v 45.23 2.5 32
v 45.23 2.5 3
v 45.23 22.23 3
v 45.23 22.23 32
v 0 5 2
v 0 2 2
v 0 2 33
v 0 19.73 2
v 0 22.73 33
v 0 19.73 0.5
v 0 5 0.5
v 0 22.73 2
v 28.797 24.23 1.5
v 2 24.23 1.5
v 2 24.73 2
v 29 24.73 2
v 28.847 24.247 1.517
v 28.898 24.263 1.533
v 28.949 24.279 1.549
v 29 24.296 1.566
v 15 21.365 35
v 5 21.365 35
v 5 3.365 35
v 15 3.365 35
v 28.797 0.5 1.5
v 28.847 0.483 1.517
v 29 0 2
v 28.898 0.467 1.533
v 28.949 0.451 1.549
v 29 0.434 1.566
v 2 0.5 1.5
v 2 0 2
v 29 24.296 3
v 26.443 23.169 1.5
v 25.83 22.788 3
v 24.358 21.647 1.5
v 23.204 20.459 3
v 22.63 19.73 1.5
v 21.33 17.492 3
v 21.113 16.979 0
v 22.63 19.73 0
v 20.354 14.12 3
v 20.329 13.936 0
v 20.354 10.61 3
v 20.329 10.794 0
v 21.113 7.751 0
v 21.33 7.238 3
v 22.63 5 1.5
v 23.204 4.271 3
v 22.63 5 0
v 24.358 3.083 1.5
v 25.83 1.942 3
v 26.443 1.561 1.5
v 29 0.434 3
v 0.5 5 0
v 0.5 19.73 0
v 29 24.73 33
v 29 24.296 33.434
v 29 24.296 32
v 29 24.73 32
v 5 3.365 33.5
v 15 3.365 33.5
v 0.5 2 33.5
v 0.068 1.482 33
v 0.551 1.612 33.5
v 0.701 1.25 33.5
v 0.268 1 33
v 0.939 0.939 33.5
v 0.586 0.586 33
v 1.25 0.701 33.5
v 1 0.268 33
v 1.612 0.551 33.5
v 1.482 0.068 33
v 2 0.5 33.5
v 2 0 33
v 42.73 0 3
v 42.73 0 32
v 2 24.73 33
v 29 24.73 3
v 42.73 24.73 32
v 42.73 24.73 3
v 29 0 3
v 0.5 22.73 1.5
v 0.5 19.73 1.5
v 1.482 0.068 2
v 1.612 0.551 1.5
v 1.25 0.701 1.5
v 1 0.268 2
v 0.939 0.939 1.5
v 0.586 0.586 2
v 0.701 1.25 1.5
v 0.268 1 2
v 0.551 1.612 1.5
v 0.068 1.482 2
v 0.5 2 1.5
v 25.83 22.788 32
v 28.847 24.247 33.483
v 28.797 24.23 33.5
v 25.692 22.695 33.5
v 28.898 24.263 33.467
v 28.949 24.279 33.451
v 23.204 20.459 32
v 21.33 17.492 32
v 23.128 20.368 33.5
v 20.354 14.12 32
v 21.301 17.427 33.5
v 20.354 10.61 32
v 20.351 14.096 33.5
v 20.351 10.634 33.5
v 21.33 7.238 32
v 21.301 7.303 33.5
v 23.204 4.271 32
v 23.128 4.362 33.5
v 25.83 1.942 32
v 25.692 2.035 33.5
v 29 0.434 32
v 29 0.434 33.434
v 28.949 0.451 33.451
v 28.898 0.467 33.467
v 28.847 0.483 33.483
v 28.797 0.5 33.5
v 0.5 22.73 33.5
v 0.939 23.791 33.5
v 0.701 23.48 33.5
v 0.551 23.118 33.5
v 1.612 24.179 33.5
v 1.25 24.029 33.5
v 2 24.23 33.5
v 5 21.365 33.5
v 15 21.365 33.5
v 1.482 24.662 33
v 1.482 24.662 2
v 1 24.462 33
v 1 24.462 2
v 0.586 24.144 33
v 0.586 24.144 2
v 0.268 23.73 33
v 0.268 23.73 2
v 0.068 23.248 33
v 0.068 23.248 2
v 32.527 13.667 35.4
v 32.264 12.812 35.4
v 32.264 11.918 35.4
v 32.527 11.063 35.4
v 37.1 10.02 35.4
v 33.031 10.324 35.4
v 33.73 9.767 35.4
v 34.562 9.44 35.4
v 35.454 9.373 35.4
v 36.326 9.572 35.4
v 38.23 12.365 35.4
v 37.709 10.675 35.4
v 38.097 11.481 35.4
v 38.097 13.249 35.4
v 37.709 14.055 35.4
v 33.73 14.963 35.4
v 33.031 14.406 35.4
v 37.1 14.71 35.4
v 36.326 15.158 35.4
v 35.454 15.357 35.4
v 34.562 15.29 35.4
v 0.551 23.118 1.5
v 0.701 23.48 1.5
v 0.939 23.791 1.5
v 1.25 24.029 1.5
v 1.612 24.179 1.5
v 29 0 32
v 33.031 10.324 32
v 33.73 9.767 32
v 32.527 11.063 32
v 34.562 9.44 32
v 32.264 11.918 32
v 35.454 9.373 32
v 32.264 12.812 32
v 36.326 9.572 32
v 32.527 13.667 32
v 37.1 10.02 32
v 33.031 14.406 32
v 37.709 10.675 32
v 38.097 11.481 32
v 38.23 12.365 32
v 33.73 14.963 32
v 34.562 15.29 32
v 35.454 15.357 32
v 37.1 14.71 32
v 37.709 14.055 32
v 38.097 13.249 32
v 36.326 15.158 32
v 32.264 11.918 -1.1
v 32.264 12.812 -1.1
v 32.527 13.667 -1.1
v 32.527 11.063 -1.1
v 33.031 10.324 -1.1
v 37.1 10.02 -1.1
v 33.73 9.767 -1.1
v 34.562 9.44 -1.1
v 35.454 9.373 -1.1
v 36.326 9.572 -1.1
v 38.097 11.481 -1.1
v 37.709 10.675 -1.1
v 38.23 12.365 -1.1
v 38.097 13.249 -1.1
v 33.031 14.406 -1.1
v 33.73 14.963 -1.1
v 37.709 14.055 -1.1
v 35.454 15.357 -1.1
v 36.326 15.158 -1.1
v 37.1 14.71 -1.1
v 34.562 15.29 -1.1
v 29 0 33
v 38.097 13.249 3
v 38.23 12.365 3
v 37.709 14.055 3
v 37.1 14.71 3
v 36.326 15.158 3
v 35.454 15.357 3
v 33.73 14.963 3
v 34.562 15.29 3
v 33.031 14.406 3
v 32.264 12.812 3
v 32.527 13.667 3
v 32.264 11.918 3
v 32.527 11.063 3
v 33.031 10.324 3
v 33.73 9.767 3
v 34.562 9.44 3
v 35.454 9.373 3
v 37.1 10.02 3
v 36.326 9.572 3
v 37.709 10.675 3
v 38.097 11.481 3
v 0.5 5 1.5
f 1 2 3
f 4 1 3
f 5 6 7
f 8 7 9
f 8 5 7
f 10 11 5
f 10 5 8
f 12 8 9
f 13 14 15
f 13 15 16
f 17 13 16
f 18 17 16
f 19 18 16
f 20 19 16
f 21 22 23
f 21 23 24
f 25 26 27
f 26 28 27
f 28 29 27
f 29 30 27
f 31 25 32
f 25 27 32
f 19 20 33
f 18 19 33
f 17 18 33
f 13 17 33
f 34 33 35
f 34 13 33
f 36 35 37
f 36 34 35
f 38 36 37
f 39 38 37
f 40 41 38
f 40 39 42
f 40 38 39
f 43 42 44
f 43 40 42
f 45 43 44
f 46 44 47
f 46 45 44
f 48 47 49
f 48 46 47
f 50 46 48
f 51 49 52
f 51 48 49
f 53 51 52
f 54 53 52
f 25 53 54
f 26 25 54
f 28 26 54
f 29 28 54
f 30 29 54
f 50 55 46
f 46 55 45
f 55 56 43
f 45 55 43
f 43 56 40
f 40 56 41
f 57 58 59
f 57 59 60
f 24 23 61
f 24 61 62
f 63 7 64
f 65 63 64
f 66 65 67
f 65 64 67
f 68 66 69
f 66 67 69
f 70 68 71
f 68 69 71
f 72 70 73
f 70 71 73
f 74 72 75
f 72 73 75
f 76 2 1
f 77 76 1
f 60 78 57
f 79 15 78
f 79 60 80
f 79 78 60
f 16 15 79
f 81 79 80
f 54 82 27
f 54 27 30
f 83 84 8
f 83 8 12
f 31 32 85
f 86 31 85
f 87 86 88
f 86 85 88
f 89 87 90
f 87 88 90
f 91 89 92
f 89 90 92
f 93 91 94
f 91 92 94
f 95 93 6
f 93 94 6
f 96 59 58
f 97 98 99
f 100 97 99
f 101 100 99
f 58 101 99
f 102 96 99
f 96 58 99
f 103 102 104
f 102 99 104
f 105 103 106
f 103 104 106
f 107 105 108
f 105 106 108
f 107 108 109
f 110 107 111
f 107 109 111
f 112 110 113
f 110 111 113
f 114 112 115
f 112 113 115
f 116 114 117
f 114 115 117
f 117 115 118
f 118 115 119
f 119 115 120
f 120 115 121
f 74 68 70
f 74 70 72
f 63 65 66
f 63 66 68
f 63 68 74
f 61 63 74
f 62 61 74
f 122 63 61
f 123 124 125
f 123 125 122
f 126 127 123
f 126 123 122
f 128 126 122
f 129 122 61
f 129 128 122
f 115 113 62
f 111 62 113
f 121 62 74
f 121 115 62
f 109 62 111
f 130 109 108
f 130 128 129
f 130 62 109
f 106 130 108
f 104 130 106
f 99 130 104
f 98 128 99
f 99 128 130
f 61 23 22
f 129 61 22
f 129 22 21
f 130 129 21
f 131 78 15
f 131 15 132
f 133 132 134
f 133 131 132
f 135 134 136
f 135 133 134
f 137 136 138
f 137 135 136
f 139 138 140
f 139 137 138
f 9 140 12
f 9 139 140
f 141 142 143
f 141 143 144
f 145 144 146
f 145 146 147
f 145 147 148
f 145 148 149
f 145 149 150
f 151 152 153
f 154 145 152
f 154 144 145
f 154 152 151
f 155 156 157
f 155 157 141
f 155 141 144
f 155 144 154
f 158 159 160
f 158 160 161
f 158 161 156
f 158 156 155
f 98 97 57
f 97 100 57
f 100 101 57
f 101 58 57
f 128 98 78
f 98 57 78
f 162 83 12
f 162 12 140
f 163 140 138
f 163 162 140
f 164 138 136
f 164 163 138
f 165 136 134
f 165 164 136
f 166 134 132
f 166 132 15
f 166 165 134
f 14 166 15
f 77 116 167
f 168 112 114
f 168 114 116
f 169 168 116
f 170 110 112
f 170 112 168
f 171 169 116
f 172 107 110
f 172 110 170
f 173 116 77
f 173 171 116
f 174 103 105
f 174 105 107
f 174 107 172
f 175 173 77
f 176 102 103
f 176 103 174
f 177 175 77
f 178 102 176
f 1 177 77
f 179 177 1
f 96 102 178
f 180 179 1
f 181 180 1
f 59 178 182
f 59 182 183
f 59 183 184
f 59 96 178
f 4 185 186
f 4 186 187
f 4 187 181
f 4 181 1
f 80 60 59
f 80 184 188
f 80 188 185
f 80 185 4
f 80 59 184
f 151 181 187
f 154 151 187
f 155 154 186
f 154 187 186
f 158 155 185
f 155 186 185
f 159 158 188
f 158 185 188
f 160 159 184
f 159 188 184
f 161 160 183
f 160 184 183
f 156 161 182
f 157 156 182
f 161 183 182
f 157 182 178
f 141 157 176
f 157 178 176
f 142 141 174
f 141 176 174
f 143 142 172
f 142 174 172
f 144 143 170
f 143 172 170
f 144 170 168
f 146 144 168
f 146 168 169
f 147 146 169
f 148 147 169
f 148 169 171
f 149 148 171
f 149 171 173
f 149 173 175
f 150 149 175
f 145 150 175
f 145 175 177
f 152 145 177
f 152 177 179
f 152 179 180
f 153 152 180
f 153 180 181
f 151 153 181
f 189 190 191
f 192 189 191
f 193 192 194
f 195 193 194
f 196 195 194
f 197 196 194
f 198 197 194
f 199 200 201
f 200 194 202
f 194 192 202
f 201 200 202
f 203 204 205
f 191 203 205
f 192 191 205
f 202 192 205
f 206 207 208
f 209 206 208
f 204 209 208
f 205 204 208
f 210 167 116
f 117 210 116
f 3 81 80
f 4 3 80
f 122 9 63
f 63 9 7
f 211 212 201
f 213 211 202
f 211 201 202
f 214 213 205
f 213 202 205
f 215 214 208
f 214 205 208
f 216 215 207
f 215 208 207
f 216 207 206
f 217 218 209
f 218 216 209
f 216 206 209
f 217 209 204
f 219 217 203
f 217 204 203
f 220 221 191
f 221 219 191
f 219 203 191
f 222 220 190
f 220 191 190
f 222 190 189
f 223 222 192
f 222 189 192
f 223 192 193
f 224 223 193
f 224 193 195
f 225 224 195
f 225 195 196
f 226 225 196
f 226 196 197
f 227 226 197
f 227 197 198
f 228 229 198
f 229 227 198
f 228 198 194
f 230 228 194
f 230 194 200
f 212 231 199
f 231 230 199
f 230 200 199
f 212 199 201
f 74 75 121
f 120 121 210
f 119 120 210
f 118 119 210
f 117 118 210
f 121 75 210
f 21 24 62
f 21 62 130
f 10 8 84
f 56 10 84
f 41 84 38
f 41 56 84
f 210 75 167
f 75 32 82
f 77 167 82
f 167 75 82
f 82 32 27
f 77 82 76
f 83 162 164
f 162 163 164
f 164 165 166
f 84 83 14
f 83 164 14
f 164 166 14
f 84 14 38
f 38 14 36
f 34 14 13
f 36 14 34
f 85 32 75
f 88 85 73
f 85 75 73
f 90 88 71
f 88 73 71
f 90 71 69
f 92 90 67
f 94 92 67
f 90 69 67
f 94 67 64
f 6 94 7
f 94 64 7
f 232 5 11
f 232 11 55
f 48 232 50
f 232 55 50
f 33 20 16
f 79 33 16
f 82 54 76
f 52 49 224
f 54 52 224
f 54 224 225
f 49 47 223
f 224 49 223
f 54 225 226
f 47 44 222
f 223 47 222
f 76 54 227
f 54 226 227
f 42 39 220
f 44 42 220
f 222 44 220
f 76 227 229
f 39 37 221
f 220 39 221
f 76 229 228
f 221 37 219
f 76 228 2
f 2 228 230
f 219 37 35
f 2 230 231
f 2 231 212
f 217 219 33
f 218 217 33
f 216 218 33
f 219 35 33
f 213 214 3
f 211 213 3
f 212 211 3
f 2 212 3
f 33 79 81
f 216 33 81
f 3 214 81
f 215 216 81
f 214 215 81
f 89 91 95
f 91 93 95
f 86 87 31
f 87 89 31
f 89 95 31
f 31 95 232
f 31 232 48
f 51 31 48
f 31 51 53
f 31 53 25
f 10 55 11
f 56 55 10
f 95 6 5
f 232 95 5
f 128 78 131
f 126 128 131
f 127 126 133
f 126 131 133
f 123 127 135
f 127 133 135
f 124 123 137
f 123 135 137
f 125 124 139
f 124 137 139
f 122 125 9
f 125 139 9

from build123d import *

# Parameters (mm, degrees)
SKETCH_1_W           = 45.23
SKETCH_1_H           = 24.73
EXTRUDE_1_DEPTH      = 35
CUT_EXTRUDE_1_DEPTH  = 3
SKETCH_5_W           = 1.897849624
SKETCH_5_H           = 24.73
CUT_EXTRUDE_3_DEPTH  = 3
EXTRUDE_2_DEPTH      = 17.9
EXTRUDE_2_DEPTH_BACK = 18.6
EXTRUDE_2_START      = 17.5
SKETCH_3_R           = 3
SKETCH_4_W           = 30.897849624
SKETCH_4_H           = 5
CUT_EXTRUDE_2_DEPTH  = 1.5
CHAMFER_1_SIZE       = 2.5
FILLET_1_R           = 2
SKETCH_6_W           = 10
SKETCH_6_H           = 18
CUT_EXTRUDE_4_DEPTH  = 1.5
CHAMFER_2_SIZE       = 0.5


with BuildPart() as part:
    # 草图1 → 凸台-拉伸1 (new body)
    with BuildSketch(Plane.XY):
        with Locations((22.615, 12.365)):
            Rectangle(SKETCH_1_W, SKETCH_1_H)
    extrude(amount=EXTRUDE_1_DEPTH)

    # 草图2 → 切除-拉伸1 (cut)
    with BuildSketch(Plane.XY):
        with BuildLine():
            Line((45.23, 24.73), (30.897849624, 24.73))
            ThreePointArc((30.897849624, 24.73), (20.23, 12.365), (30.897849624, 0))
            Line((30.897849624, 0), (45.23, 0))
            Line((45.23, 0), (45.23, 24.73))
        make_face()
    cut_extrude_1 = extrude(amount=CUT_EXTRUDE_1_DEPTH, mode=Mode.SUBTRACT)

    # 草图5 → 切除-拉伸3 (cut)
    with BuildSketch(Plane.XY):
        with Locations((29.948924812, 12.365)):
            Rectangle(SKETCH_5_W, SKETCH_5_H)
    cut_extrude_3 = extrude(amount=CUT_EXTRUDE_3_DEPTH, mode=Mode.SUBTRACT)

    # 镜向1: 切除-拉伸1, 切除-拉伸3 across plane
    add(cut_extrude_1.mirror(Plane.XY.offset(17.5)), mode=Mode.SUBTRACT)
    add(cut_extrude_3.mirror(Plane.XY.offset(17.5)), mode=Mode.SUBTRACT)

    # 草图3 → 凸台-拉伸2 (add, two sides: drawn at the far end of the back side and taken through both)
    with BuildSketch(Plane.XY.offset(EXTRUDE_2_START - EXTRUDE_2_DEPTH_BACK)):
        with Locations((35.23, 12.365)):
            Circle(SKETCH_3_R)
    extrude(amount=EXTRUDE_2_DEPTH + EXTRUDE_2_DEPTH_BACK)

    # 草图4 → 切除-拉伸2 (cut)
    with BuildSketch(Plane.XY):
        with Locations((15.448924812, 22.23)):
            Rectangle(SKETCH_4_W, SKETCH_4_H)
        with Locations((15.448924812, 2.5)):
            Rectangle(SKETCH_4_W, SKETCH_4_H)
    extrude(amount=CUT_EXTRUDE_2_DEPTH, mode=Mode.SUBTRACT)

    # 倒角1
    chamfer_1_edges = [part.edges().sort_by_distance(p)[0] for p in [
        (45.23, 0, 17.5),
        (45.23, 24.73, 17.5),
    ]]
    chamfer(chamfer_1_edges, length=CHAMFER_1_SIZE)

    # 圆角1
    fillet_1_edges = [part.edges().sort_by_distance(p)[0] for p in [
        (0, 24.73, 18.25),
        (0, 0, 18.25),
    ]]
    fillet(fillet_1_edges, radius=FILLET_1_R)

    # 草图6 → 切除-拉伸4 (cut)
    with BuildSketch(Plane.XY.offset(35)):
        with BuildLine():
            Line((29, 24.73), (2, 24.73))
            ThreePointArc((2, 24.73), (0.585786438, 24.144213562), (0, 22.73))
            Line((0, 22.73), (0, 2))
            ThreePointArc((0, 2), (0.585786438, 0.585786438), (2, 0))
            Line((2, 0), (29, 0))
            Line((29, 0), (29, 0.434488695))
            ThreePointArc((29, 0.434488695), (20.23, 12.365), (29, 24.295511305))
            Line((29, 24.295511305), (29, 24.73))
        make_face()
        with Locations((10, 12.365)):
            Rectangle(SKETCH_6_W, SKETCH_6_H, mode=Mode.SUBTRACT)
    extrude(amount=-CUT_EXTRUDE_4_DEPTH, mode=Mode.SUBTRACT)

    # 倒角2
    chamfer_2_edges = [part.edges().sort_by_distance(p)[0] for p in [
        (0, 21.23, 1.5),
        (15.5, 24.73, 1.5),
        (0, 12.365, 0),
        (0, 3.5, 1.5),
        (15.5, 0, 1.5),
        (15.5, 24.73, 33.5),
        (15.5, 0, 33.5),
    ]]
    chamfer(chamfer_2_edges, length=CHAMFER_2_SIZE)


solid = part.part
